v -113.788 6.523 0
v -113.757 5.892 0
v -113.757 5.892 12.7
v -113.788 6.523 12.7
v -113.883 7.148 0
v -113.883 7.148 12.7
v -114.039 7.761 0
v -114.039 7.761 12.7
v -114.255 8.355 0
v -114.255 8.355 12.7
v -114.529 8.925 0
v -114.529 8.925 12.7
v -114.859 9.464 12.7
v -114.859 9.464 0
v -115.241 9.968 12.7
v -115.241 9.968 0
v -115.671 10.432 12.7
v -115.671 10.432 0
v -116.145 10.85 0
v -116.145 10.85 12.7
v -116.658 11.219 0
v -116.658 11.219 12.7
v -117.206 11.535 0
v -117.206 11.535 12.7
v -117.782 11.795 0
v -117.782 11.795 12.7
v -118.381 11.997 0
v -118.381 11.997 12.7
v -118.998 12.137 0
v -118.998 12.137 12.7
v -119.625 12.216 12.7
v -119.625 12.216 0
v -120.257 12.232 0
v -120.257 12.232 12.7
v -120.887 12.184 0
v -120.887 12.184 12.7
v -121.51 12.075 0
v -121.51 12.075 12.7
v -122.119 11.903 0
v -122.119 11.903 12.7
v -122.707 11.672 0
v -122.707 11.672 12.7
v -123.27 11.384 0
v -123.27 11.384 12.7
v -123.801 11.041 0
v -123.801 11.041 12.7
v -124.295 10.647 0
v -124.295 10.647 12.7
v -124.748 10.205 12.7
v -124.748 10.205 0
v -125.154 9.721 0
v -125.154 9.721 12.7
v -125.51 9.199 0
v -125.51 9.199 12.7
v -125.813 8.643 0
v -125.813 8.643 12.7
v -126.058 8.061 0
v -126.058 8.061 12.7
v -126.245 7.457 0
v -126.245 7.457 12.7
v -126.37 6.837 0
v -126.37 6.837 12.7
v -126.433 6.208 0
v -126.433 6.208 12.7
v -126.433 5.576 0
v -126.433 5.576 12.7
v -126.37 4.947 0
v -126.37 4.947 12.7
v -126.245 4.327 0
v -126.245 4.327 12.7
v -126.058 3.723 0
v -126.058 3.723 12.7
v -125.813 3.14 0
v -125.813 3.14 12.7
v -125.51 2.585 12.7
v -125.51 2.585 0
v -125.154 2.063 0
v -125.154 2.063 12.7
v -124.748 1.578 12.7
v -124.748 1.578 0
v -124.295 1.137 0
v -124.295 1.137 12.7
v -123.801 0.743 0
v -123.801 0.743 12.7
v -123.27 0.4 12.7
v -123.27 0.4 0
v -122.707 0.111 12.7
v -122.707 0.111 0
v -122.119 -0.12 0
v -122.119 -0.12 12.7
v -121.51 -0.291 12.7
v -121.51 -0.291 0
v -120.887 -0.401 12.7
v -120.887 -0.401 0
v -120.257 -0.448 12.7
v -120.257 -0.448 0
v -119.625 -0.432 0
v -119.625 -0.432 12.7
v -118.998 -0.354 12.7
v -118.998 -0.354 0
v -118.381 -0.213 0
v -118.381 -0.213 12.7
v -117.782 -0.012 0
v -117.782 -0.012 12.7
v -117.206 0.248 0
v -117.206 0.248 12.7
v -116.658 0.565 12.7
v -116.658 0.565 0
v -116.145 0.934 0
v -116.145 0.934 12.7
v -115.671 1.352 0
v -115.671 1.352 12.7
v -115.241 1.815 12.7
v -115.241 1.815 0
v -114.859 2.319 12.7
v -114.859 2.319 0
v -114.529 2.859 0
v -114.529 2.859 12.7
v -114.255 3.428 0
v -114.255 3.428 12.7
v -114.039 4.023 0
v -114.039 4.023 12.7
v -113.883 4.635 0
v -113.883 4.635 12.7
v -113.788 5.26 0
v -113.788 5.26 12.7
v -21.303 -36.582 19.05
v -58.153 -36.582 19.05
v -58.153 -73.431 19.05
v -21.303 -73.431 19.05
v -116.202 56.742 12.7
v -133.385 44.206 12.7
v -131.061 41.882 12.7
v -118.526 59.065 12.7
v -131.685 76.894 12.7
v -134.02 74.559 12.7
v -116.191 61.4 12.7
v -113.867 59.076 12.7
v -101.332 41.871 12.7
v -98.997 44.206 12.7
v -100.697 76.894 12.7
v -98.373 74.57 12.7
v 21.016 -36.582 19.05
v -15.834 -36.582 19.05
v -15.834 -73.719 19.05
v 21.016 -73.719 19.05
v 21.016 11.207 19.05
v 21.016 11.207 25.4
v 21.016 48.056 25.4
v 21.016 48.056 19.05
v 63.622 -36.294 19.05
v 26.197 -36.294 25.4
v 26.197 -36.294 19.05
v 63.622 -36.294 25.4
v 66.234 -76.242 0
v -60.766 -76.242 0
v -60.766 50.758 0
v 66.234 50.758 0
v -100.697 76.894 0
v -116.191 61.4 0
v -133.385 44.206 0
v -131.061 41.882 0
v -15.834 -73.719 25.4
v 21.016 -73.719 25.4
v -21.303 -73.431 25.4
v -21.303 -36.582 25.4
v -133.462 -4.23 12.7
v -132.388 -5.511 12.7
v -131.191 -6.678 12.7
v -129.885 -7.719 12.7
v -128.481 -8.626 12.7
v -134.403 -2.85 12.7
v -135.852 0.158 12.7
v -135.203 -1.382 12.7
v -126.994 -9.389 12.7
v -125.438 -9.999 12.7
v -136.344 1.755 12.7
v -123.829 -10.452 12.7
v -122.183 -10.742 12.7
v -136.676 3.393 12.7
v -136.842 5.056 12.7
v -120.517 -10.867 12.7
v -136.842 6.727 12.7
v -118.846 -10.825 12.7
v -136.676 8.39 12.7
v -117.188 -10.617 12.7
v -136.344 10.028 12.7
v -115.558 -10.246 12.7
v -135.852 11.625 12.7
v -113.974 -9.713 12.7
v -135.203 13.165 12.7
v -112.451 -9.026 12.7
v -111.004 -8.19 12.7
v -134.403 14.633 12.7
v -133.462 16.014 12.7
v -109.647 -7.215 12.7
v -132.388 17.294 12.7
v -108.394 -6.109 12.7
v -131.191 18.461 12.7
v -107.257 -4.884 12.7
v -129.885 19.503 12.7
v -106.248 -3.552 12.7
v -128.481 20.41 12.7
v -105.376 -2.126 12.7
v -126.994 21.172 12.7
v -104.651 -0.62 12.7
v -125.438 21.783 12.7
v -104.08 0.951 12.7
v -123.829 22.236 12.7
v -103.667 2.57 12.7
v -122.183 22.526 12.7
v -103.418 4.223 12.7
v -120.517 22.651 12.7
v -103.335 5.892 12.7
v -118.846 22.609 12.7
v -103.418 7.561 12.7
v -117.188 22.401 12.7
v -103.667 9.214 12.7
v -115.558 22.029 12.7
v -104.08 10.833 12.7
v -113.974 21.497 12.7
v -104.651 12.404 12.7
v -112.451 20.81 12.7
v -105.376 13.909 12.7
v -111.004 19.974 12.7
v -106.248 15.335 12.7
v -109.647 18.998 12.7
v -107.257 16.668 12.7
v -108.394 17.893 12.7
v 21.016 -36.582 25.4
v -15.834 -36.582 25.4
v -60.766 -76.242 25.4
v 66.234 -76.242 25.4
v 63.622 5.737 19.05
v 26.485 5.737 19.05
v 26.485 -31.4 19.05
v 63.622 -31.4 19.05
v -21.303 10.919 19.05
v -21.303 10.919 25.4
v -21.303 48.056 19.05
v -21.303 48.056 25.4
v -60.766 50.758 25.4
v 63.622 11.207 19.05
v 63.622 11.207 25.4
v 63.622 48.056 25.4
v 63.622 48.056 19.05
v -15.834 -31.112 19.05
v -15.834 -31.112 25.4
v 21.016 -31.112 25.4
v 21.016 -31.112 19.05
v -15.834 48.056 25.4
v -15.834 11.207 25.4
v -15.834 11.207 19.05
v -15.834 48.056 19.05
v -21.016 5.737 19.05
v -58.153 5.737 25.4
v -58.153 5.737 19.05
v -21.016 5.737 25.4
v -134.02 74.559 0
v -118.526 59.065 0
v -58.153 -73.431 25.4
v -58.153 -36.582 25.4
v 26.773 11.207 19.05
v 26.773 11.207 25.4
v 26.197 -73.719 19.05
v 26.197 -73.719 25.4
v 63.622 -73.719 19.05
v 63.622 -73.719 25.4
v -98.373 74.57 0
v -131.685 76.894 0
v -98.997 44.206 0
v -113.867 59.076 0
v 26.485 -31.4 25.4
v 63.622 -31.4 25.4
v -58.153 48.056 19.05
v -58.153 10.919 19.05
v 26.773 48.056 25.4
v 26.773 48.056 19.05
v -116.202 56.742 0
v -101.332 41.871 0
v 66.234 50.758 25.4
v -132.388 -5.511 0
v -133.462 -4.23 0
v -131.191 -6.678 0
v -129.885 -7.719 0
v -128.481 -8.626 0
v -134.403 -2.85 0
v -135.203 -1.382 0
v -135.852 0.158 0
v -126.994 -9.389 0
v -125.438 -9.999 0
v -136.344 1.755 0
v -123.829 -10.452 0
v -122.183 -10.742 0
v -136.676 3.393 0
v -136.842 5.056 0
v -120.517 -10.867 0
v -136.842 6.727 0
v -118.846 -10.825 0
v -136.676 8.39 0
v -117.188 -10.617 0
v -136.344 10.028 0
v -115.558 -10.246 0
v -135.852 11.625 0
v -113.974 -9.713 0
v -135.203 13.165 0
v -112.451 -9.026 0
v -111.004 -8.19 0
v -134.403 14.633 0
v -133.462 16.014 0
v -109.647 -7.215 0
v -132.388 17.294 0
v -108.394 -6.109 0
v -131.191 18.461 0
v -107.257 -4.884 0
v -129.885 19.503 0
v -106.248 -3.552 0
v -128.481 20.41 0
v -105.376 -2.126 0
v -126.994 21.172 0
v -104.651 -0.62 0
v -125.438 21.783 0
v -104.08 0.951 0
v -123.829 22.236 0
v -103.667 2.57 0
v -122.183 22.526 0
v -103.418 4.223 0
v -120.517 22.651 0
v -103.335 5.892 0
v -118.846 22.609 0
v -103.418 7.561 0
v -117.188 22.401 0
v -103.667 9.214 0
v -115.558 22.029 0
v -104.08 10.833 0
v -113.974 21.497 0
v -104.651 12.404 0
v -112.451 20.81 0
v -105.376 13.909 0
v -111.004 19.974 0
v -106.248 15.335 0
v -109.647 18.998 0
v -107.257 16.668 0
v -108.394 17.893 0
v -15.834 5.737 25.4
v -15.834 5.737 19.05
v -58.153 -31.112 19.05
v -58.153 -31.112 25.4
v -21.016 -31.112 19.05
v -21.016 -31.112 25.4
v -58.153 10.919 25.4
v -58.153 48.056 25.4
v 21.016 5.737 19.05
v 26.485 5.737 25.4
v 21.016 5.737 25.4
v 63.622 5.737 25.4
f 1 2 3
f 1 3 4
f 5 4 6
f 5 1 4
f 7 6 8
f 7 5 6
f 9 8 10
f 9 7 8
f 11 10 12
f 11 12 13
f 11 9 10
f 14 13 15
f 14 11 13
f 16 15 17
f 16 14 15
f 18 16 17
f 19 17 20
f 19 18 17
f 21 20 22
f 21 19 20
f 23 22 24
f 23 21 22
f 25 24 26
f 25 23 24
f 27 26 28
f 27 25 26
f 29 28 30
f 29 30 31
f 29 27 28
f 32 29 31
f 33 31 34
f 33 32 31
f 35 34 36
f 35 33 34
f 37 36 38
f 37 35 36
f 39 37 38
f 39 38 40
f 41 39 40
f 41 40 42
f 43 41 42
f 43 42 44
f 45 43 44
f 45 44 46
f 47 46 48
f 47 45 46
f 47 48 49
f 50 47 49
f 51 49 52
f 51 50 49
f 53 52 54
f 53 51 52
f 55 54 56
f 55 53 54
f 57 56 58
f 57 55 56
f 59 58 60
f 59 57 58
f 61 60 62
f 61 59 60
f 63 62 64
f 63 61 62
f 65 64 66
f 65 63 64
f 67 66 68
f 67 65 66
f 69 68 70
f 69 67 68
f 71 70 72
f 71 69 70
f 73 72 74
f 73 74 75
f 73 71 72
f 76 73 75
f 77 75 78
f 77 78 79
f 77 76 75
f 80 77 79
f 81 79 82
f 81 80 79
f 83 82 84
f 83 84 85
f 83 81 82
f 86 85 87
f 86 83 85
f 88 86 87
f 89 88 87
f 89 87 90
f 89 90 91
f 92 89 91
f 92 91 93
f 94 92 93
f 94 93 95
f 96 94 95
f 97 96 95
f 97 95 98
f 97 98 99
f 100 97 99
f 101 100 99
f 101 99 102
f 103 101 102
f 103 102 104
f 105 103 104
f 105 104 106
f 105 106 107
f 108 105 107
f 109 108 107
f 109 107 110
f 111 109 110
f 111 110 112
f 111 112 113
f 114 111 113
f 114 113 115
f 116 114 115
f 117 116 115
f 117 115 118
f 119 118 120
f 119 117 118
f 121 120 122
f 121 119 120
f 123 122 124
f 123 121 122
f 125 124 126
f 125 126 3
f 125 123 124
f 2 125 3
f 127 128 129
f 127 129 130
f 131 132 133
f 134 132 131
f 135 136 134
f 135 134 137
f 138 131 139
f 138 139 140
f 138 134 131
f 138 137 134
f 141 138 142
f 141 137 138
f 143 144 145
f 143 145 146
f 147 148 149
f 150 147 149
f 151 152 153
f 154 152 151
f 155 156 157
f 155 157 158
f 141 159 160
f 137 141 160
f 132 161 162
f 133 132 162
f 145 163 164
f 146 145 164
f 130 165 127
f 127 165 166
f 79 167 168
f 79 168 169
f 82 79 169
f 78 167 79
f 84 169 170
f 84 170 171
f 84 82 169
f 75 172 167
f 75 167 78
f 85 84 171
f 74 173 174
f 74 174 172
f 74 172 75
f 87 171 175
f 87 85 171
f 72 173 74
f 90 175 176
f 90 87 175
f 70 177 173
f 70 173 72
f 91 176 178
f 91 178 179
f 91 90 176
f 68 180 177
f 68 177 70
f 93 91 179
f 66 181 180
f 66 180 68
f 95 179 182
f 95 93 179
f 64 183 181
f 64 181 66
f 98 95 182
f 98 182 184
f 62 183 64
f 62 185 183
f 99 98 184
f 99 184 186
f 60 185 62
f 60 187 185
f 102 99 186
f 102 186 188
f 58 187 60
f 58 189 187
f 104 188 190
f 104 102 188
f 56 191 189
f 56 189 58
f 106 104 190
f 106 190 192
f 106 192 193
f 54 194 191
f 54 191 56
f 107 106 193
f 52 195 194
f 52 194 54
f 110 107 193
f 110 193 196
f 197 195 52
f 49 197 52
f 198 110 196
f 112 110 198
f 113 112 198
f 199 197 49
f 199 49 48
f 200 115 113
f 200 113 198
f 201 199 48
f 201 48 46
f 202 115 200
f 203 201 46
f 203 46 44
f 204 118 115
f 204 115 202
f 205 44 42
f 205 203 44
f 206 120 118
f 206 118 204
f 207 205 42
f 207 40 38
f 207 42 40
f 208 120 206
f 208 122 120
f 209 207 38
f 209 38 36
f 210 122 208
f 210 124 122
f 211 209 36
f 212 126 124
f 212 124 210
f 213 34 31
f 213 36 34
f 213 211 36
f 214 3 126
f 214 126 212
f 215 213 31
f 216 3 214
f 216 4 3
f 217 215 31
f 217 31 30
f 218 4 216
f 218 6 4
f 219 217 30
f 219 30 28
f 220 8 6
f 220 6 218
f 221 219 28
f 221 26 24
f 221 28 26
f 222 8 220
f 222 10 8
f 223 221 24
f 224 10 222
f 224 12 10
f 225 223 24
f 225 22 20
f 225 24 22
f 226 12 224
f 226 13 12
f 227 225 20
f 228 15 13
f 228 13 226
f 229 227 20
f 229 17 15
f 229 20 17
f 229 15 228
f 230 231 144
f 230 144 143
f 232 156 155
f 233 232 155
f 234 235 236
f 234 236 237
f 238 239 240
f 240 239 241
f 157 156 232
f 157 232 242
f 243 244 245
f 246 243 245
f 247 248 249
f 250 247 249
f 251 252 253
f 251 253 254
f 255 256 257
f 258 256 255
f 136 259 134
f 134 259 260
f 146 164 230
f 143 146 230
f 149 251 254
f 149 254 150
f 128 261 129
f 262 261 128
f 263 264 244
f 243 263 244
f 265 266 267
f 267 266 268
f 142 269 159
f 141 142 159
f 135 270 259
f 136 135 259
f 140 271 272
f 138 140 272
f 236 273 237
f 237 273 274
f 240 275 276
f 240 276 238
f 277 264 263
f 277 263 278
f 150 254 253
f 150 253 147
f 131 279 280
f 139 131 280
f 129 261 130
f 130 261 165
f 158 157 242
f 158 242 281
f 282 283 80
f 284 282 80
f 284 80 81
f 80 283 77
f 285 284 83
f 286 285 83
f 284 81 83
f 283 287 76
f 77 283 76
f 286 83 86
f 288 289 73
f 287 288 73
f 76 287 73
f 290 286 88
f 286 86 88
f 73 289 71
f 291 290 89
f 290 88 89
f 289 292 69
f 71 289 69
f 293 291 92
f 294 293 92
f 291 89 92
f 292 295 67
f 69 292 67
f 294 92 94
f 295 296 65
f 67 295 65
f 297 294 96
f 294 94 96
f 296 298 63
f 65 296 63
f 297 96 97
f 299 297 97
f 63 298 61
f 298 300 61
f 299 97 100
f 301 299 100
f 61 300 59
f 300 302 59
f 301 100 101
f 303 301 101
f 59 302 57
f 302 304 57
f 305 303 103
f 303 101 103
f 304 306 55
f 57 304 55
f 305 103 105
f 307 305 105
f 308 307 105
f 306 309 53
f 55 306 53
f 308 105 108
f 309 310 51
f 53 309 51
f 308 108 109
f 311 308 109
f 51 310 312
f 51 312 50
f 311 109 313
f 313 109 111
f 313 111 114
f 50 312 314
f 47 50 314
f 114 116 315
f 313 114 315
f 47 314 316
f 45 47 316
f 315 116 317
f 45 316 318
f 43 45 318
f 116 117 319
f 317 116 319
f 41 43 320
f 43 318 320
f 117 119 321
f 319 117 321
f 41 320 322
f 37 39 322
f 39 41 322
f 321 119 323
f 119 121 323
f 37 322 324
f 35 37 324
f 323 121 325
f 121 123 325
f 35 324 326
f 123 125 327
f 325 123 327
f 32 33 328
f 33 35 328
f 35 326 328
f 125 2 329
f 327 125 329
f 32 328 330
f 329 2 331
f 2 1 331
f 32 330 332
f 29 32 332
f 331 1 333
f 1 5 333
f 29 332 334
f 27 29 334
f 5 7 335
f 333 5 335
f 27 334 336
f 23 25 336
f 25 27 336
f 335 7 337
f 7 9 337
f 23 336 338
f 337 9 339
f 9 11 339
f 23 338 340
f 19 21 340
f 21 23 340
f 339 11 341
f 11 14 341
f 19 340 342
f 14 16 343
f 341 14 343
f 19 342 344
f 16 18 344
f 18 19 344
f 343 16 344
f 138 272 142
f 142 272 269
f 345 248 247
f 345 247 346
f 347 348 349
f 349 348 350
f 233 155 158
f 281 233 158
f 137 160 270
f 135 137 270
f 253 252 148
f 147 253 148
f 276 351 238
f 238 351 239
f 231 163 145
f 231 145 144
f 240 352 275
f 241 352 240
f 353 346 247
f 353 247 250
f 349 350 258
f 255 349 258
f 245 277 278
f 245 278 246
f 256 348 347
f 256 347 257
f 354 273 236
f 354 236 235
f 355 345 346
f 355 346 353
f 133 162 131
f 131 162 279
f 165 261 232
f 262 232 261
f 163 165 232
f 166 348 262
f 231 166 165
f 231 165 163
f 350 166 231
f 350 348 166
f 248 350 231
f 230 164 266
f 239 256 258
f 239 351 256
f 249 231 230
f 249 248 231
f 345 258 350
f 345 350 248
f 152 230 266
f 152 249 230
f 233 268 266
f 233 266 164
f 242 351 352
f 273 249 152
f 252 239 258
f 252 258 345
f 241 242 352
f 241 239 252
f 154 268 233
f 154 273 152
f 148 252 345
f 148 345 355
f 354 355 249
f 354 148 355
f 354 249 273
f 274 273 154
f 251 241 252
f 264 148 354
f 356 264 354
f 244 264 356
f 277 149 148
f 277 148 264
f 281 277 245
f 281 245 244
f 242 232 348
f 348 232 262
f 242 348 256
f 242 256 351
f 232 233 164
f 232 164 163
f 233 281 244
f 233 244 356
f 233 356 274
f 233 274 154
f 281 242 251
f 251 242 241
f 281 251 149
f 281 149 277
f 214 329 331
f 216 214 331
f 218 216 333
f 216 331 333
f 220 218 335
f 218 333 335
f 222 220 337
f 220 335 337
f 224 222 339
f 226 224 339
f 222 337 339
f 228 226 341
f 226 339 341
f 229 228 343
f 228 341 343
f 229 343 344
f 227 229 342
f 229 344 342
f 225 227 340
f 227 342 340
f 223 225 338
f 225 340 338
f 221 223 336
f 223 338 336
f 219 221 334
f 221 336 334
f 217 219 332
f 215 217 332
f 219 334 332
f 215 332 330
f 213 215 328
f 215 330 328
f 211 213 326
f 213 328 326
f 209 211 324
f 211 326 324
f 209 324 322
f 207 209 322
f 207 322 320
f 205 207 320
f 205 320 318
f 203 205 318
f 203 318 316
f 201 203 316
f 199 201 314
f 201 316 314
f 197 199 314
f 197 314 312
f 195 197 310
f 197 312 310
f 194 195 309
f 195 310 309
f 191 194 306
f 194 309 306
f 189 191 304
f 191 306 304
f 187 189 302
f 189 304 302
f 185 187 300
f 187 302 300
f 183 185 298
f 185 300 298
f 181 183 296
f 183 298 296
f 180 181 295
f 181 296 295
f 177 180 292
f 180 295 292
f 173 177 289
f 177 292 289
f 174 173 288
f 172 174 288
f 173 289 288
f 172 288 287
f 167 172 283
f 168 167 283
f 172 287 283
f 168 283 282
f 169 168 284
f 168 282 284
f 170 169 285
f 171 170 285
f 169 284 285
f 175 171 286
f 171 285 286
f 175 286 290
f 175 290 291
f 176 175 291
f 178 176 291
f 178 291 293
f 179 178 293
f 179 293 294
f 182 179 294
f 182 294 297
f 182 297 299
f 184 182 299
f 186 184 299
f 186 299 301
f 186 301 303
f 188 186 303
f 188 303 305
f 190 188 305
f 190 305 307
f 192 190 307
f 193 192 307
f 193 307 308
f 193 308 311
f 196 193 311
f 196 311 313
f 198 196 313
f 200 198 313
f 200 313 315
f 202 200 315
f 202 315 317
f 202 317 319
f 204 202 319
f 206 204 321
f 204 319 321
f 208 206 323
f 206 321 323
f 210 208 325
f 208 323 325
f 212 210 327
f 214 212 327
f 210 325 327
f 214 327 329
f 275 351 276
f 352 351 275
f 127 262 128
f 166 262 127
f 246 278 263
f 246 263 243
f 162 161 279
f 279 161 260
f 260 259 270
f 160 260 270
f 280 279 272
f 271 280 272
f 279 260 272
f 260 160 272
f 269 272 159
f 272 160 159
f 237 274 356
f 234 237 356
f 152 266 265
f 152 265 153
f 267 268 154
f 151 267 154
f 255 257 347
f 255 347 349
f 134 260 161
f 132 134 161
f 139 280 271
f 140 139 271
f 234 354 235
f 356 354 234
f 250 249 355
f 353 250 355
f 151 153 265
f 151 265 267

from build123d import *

# Parameters (mm, degrees)
F0_W     = 127
F0_H     = 127
F1_DEPTH = 25.4
F2_W     = 36.8491709232
F2_H     = 37.1370585635
F2_W_2   = 36.8491690606
F2_H_2   = 36.8491737172
F2_W_3   = 36.8491727859
F2_W_4   = 37.1370539069
F2_H_3   = 36.8491718546
F2_W_5   = 37.1370557696
F2_H_4   = 37.1370548382
F2_H_5   = 36.8491709232
F2_H_6   = 37.1370613575
F2_W_6   = 37.4249406159
F2_H_7   = 37.4249443412
F3_DEPTH = 6.35
F5_DEPTH = 12.7
F6_R     = 16.764
F6_R_2   = 6.3418339622
F7_DEPTH = 12.7


with BuildPart() as f1:
    # F0 (on Top) → F1 (new body)
    with BuildSketch(Plane.XY):
        with Locations((2.7341544628, -12.7415094916)):
            Rectangle(F0_W, F0_H)
    extrude(amount=F1_DEPTH)

    # F2 (on face) → F3 (cut)
    with BuildSketch(Plane.XY.offset(25.4)):
        with Locations((-39.7280119359, 29.4873728417)):
            Rectangle(F2_W, F2_H)
        with Locations((2.5909570977, 29.6313152649)):
            Rectangle(F2_W_2, F2_H_2)
        with Locations((45.1978137717, 29.6313152649)):
            Rectangle(F2_W_3, F2_H_2)
        with Locations((-39.5840704441, -12.6876565628)):
            Rectangle(F2_W_4, F2_H_3)
        with Locations((2.5909570977, -12.6876565628)):
            Rectangle(F2_W_2, F2_H_3)
        with Locations((45.0538722798, -12.8315980546)):
            Rectangle(F2_W_5, F2_H_4)
        with Locations((-39.7280119359, -55.0066232681)):
            Rectangle(F2_W, F2_H_5)
        with Locations((2.5909570977, -55.1505684853)):
            Rectangle(F2_W_2, F2_H_6)
        with Locations((44.9099298567, -55.0066269934)):
            Rectangle(F2_W_6, F2_H_7)
    extrude(amount=-F3_DEPTH, mode=Mode.SUBTRACT)


with BuildPart() as f5:
    # F4 (on Top) → F5 (new body)
    with BuildSketch(Plane.XY):
        Polygon((-98.3731364228, 74.5703850207), (-100.6970453433, 76.8942939412), (-116.1910453433, 61.4002939412), (-113.8671364228, 59.0763850207), align=None)
        Polygon((-113.8671364228, 59.0763850207), (-116.1910453433, 61.4002939412), (-118.5259119348, 59.0654273498), (-116.2020030143, 56.7415184292), align=None)
        Polygon((-118.5259119348, 59.0654273498), (-116.1910453433, 61.4002939412), (-131.6850453433, 76.8942939412), (-134.0199119348, 74.5594273498), align=None)
        Polygon((-116.2020030143, 56.7415184292), (-118.5259119348, 59.0654273498), (-133.385177624, 44.2061616605), (-131.0612687035, 41.88225274), align=None)
        Polygon((-98.9969130626, 44.2061616605), (-113.8671364228, 59.0763850207), (-116.2020030143, 56.7415184292), (-101.3317796541, 41.8712950691), align=None)
    extrude(amount=F5_DEPTH)


with BuildPart() as f7:
    # F6 (on Top) → F7 (new body)
    with BuildSketch(Plane.XY):
        with Locations((-120.0988069177, 5.8918311261)):
            Circle(F6_R)
        with Locations((-120.0988069177, 5.8918311261)):
            Circle(F6_R_2, mode=Mode.SUBTRACT)
    extrude(amount=F7_DEPTH)


solid = Compound([f1.part, f5.part, f7.part])
